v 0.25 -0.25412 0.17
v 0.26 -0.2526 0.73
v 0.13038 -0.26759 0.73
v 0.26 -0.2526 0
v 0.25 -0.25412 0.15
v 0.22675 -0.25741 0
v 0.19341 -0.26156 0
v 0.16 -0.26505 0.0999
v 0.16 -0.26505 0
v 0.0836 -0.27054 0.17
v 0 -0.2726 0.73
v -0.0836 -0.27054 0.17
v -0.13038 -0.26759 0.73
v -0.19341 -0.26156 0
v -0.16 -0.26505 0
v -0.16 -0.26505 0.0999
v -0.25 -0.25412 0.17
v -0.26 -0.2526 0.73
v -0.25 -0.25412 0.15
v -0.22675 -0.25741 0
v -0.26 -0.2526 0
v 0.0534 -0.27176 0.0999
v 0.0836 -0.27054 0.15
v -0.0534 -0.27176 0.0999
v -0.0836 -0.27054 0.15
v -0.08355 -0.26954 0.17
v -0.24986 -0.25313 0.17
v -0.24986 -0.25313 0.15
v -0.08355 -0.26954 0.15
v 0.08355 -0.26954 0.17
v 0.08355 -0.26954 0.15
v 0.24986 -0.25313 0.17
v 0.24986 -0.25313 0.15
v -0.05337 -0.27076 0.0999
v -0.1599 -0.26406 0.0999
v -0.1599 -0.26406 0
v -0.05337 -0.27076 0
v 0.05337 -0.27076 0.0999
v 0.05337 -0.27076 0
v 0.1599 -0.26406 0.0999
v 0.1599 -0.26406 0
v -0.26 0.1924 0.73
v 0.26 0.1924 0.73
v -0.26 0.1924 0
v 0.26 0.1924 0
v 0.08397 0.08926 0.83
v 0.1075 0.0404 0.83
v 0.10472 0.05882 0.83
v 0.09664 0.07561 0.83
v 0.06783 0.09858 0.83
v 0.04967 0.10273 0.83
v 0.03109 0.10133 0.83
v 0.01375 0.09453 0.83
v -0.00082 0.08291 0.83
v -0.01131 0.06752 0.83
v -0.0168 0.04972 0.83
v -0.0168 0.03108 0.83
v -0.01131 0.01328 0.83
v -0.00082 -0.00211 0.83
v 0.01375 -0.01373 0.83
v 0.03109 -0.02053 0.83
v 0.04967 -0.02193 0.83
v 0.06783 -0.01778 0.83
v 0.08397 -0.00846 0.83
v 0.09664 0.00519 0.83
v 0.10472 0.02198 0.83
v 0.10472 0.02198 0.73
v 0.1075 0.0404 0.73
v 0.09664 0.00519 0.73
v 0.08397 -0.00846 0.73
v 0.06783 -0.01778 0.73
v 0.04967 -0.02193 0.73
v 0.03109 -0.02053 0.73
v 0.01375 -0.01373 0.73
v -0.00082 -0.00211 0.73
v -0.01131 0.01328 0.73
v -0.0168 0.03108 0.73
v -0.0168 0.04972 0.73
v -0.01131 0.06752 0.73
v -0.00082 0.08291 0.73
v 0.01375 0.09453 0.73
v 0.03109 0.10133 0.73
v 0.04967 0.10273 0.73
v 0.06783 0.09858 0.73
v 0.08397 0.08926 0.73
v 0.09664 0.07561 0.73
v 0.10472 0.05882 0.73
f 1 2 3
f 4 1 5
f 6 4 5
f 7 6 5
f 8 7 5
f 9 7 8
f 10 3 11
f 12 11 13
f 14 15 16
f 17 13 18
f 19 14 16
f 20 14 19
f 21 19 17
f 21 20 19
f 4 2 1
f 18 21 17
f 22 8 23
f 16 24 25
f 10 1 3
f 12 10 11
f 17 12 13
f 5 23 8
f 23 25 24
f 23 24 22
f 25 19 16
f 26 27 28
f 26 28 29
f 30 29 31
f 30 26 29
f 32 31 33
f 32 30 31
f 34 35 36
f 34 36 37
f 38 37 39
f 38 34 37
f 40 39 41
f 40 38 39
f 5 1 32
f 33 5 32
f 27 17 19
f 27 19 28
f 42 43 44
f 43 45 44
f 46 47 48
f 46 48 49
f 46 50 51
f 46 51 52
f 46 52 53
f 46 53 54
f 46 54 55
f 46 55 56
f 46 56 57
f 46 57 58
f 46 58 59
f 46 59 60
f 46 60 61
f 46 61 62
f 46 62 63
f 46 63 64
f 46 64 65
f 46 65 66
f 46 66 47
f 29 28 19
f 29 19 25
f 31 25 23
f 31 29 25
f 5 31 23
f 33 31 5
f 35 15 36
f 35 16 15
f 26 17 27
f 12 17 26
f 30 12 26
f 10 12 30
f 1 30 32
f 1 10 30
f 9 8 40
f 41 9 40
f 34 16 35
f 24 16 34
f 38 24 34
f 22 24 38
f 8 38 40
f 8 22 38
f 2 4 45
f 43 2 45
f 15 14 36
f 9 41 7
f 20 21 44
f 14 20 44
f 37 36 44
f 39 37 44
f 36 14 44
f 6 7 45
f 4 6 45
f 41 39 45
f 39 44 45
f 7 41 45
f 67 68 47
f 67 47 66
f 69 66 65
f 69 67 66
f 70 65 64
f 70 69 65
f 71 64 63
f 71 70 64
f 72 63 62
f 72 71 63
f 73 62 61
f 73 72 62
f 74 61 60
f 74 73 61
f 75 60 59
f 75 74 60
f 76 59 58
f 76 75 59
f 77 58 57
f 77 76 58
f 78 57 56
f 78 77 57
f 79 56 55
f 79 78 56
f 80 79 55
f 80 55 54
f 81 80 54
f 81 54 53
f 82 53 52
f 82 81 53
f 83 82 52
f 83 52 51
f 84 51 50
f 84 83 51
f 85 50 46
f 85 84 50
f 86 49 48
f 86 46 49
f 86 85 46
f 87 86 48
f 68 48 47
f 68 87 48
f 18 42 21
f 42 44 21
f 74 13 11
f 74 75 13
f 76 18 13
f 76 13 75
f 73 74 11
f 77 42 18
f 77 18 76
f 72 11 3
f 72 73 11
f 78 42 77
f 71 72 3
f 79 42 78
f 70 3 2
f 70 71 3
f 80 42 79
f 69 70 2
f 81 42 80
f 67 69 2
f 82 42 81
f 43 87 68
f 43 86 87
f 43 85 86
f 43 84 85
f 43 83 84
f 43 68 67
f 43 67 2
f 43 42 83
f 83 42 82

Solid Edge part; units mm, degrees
sketch "Sketch1" plane through (0, 0, 0) normal (0, 0, 1) x (1, 0, 0)
  line L0 (0.26, -0.2526) -> (0.26, 0.1924)
  line L1 (0.26, 0.1924) -> (-0.26, 0.1924)
  line L2 (-0.26, 0.1924) -> (-0.26, -0.2526)
  arc A0 (-0.26, -0.2526) -> (0.26, -0.2526) centre (0, 1.4274) ccw
  dimension "D1" = 0.26
  dimension "D2" = 0
extrude "Protrusion1" add sketch "Sketch1" along normal blind 0.73
sketch "Sketch2" plane through (0, 0.0009, 0.73) normal (0, 0, 1) x (1, 0, 0)
  circle A0 centre (0.045, 0.0395) radius 0.0625
  dimension "D1" = 0.125
extrude "Abgasstutzen" add sketch "Sketch2" along normal blind 0.1
sketch "Sketch3" plane through (0, -0.0401, 0) normal (0, 0, -1) x (1, 0, 0)
  arc A0 (-0.25, 0.214) -> (0.25, 0.214) centre (0, -1.4675) cw
sketch "Sketch4" plane through (0, 0, 0) normal (1, 0, 0) x (0, 1, 0)
  line L0 (-0.2792, 0.15) -> (-0.2716, 0.15)
  line L1 (-0.2716, 0.15) -> (-0.2716, 0.17)
  line L2 (-0.2716, 0.17) -> (-0.2792, 0.17)
  line L3 (-0.2792, 0.17) -> (-0.2792, 0.15)
  dimension "D1" = 0.02
sweep "SweptCutout1" cut profiles "Sketch4" path "Sketch3"
sketch "Sketch5" plane through (0, -0.0401, 0) normal (0, 0, -1) x (1, 0, 0)
  arc A0 (-0.16, 0.225) -> (0.16, 0.225) centre (0, -1.4675) cw
sketch "Sketch6" plane through (0, 0, 0) normal (1, 0, 0) x (0, 1, 0)
  line L0 (-0.2716, -0.0001) -> (-0.2716, 0.0999)
  line L1 (-0.2716, 0.0999) -> (-0.2816, 0.0999)
  line L2 (-0.2816, 0.0999) -> (-0.2816, -0.0001)
  line L3 (-0.2816, -0.0001) -> (-0.2716, -0.0001)
  dimension "D1" = 0.1
  dimension "D2" = 0.01
sweep "SweptCutout2" cut profiles "Sketch6" path "Sketch5"
